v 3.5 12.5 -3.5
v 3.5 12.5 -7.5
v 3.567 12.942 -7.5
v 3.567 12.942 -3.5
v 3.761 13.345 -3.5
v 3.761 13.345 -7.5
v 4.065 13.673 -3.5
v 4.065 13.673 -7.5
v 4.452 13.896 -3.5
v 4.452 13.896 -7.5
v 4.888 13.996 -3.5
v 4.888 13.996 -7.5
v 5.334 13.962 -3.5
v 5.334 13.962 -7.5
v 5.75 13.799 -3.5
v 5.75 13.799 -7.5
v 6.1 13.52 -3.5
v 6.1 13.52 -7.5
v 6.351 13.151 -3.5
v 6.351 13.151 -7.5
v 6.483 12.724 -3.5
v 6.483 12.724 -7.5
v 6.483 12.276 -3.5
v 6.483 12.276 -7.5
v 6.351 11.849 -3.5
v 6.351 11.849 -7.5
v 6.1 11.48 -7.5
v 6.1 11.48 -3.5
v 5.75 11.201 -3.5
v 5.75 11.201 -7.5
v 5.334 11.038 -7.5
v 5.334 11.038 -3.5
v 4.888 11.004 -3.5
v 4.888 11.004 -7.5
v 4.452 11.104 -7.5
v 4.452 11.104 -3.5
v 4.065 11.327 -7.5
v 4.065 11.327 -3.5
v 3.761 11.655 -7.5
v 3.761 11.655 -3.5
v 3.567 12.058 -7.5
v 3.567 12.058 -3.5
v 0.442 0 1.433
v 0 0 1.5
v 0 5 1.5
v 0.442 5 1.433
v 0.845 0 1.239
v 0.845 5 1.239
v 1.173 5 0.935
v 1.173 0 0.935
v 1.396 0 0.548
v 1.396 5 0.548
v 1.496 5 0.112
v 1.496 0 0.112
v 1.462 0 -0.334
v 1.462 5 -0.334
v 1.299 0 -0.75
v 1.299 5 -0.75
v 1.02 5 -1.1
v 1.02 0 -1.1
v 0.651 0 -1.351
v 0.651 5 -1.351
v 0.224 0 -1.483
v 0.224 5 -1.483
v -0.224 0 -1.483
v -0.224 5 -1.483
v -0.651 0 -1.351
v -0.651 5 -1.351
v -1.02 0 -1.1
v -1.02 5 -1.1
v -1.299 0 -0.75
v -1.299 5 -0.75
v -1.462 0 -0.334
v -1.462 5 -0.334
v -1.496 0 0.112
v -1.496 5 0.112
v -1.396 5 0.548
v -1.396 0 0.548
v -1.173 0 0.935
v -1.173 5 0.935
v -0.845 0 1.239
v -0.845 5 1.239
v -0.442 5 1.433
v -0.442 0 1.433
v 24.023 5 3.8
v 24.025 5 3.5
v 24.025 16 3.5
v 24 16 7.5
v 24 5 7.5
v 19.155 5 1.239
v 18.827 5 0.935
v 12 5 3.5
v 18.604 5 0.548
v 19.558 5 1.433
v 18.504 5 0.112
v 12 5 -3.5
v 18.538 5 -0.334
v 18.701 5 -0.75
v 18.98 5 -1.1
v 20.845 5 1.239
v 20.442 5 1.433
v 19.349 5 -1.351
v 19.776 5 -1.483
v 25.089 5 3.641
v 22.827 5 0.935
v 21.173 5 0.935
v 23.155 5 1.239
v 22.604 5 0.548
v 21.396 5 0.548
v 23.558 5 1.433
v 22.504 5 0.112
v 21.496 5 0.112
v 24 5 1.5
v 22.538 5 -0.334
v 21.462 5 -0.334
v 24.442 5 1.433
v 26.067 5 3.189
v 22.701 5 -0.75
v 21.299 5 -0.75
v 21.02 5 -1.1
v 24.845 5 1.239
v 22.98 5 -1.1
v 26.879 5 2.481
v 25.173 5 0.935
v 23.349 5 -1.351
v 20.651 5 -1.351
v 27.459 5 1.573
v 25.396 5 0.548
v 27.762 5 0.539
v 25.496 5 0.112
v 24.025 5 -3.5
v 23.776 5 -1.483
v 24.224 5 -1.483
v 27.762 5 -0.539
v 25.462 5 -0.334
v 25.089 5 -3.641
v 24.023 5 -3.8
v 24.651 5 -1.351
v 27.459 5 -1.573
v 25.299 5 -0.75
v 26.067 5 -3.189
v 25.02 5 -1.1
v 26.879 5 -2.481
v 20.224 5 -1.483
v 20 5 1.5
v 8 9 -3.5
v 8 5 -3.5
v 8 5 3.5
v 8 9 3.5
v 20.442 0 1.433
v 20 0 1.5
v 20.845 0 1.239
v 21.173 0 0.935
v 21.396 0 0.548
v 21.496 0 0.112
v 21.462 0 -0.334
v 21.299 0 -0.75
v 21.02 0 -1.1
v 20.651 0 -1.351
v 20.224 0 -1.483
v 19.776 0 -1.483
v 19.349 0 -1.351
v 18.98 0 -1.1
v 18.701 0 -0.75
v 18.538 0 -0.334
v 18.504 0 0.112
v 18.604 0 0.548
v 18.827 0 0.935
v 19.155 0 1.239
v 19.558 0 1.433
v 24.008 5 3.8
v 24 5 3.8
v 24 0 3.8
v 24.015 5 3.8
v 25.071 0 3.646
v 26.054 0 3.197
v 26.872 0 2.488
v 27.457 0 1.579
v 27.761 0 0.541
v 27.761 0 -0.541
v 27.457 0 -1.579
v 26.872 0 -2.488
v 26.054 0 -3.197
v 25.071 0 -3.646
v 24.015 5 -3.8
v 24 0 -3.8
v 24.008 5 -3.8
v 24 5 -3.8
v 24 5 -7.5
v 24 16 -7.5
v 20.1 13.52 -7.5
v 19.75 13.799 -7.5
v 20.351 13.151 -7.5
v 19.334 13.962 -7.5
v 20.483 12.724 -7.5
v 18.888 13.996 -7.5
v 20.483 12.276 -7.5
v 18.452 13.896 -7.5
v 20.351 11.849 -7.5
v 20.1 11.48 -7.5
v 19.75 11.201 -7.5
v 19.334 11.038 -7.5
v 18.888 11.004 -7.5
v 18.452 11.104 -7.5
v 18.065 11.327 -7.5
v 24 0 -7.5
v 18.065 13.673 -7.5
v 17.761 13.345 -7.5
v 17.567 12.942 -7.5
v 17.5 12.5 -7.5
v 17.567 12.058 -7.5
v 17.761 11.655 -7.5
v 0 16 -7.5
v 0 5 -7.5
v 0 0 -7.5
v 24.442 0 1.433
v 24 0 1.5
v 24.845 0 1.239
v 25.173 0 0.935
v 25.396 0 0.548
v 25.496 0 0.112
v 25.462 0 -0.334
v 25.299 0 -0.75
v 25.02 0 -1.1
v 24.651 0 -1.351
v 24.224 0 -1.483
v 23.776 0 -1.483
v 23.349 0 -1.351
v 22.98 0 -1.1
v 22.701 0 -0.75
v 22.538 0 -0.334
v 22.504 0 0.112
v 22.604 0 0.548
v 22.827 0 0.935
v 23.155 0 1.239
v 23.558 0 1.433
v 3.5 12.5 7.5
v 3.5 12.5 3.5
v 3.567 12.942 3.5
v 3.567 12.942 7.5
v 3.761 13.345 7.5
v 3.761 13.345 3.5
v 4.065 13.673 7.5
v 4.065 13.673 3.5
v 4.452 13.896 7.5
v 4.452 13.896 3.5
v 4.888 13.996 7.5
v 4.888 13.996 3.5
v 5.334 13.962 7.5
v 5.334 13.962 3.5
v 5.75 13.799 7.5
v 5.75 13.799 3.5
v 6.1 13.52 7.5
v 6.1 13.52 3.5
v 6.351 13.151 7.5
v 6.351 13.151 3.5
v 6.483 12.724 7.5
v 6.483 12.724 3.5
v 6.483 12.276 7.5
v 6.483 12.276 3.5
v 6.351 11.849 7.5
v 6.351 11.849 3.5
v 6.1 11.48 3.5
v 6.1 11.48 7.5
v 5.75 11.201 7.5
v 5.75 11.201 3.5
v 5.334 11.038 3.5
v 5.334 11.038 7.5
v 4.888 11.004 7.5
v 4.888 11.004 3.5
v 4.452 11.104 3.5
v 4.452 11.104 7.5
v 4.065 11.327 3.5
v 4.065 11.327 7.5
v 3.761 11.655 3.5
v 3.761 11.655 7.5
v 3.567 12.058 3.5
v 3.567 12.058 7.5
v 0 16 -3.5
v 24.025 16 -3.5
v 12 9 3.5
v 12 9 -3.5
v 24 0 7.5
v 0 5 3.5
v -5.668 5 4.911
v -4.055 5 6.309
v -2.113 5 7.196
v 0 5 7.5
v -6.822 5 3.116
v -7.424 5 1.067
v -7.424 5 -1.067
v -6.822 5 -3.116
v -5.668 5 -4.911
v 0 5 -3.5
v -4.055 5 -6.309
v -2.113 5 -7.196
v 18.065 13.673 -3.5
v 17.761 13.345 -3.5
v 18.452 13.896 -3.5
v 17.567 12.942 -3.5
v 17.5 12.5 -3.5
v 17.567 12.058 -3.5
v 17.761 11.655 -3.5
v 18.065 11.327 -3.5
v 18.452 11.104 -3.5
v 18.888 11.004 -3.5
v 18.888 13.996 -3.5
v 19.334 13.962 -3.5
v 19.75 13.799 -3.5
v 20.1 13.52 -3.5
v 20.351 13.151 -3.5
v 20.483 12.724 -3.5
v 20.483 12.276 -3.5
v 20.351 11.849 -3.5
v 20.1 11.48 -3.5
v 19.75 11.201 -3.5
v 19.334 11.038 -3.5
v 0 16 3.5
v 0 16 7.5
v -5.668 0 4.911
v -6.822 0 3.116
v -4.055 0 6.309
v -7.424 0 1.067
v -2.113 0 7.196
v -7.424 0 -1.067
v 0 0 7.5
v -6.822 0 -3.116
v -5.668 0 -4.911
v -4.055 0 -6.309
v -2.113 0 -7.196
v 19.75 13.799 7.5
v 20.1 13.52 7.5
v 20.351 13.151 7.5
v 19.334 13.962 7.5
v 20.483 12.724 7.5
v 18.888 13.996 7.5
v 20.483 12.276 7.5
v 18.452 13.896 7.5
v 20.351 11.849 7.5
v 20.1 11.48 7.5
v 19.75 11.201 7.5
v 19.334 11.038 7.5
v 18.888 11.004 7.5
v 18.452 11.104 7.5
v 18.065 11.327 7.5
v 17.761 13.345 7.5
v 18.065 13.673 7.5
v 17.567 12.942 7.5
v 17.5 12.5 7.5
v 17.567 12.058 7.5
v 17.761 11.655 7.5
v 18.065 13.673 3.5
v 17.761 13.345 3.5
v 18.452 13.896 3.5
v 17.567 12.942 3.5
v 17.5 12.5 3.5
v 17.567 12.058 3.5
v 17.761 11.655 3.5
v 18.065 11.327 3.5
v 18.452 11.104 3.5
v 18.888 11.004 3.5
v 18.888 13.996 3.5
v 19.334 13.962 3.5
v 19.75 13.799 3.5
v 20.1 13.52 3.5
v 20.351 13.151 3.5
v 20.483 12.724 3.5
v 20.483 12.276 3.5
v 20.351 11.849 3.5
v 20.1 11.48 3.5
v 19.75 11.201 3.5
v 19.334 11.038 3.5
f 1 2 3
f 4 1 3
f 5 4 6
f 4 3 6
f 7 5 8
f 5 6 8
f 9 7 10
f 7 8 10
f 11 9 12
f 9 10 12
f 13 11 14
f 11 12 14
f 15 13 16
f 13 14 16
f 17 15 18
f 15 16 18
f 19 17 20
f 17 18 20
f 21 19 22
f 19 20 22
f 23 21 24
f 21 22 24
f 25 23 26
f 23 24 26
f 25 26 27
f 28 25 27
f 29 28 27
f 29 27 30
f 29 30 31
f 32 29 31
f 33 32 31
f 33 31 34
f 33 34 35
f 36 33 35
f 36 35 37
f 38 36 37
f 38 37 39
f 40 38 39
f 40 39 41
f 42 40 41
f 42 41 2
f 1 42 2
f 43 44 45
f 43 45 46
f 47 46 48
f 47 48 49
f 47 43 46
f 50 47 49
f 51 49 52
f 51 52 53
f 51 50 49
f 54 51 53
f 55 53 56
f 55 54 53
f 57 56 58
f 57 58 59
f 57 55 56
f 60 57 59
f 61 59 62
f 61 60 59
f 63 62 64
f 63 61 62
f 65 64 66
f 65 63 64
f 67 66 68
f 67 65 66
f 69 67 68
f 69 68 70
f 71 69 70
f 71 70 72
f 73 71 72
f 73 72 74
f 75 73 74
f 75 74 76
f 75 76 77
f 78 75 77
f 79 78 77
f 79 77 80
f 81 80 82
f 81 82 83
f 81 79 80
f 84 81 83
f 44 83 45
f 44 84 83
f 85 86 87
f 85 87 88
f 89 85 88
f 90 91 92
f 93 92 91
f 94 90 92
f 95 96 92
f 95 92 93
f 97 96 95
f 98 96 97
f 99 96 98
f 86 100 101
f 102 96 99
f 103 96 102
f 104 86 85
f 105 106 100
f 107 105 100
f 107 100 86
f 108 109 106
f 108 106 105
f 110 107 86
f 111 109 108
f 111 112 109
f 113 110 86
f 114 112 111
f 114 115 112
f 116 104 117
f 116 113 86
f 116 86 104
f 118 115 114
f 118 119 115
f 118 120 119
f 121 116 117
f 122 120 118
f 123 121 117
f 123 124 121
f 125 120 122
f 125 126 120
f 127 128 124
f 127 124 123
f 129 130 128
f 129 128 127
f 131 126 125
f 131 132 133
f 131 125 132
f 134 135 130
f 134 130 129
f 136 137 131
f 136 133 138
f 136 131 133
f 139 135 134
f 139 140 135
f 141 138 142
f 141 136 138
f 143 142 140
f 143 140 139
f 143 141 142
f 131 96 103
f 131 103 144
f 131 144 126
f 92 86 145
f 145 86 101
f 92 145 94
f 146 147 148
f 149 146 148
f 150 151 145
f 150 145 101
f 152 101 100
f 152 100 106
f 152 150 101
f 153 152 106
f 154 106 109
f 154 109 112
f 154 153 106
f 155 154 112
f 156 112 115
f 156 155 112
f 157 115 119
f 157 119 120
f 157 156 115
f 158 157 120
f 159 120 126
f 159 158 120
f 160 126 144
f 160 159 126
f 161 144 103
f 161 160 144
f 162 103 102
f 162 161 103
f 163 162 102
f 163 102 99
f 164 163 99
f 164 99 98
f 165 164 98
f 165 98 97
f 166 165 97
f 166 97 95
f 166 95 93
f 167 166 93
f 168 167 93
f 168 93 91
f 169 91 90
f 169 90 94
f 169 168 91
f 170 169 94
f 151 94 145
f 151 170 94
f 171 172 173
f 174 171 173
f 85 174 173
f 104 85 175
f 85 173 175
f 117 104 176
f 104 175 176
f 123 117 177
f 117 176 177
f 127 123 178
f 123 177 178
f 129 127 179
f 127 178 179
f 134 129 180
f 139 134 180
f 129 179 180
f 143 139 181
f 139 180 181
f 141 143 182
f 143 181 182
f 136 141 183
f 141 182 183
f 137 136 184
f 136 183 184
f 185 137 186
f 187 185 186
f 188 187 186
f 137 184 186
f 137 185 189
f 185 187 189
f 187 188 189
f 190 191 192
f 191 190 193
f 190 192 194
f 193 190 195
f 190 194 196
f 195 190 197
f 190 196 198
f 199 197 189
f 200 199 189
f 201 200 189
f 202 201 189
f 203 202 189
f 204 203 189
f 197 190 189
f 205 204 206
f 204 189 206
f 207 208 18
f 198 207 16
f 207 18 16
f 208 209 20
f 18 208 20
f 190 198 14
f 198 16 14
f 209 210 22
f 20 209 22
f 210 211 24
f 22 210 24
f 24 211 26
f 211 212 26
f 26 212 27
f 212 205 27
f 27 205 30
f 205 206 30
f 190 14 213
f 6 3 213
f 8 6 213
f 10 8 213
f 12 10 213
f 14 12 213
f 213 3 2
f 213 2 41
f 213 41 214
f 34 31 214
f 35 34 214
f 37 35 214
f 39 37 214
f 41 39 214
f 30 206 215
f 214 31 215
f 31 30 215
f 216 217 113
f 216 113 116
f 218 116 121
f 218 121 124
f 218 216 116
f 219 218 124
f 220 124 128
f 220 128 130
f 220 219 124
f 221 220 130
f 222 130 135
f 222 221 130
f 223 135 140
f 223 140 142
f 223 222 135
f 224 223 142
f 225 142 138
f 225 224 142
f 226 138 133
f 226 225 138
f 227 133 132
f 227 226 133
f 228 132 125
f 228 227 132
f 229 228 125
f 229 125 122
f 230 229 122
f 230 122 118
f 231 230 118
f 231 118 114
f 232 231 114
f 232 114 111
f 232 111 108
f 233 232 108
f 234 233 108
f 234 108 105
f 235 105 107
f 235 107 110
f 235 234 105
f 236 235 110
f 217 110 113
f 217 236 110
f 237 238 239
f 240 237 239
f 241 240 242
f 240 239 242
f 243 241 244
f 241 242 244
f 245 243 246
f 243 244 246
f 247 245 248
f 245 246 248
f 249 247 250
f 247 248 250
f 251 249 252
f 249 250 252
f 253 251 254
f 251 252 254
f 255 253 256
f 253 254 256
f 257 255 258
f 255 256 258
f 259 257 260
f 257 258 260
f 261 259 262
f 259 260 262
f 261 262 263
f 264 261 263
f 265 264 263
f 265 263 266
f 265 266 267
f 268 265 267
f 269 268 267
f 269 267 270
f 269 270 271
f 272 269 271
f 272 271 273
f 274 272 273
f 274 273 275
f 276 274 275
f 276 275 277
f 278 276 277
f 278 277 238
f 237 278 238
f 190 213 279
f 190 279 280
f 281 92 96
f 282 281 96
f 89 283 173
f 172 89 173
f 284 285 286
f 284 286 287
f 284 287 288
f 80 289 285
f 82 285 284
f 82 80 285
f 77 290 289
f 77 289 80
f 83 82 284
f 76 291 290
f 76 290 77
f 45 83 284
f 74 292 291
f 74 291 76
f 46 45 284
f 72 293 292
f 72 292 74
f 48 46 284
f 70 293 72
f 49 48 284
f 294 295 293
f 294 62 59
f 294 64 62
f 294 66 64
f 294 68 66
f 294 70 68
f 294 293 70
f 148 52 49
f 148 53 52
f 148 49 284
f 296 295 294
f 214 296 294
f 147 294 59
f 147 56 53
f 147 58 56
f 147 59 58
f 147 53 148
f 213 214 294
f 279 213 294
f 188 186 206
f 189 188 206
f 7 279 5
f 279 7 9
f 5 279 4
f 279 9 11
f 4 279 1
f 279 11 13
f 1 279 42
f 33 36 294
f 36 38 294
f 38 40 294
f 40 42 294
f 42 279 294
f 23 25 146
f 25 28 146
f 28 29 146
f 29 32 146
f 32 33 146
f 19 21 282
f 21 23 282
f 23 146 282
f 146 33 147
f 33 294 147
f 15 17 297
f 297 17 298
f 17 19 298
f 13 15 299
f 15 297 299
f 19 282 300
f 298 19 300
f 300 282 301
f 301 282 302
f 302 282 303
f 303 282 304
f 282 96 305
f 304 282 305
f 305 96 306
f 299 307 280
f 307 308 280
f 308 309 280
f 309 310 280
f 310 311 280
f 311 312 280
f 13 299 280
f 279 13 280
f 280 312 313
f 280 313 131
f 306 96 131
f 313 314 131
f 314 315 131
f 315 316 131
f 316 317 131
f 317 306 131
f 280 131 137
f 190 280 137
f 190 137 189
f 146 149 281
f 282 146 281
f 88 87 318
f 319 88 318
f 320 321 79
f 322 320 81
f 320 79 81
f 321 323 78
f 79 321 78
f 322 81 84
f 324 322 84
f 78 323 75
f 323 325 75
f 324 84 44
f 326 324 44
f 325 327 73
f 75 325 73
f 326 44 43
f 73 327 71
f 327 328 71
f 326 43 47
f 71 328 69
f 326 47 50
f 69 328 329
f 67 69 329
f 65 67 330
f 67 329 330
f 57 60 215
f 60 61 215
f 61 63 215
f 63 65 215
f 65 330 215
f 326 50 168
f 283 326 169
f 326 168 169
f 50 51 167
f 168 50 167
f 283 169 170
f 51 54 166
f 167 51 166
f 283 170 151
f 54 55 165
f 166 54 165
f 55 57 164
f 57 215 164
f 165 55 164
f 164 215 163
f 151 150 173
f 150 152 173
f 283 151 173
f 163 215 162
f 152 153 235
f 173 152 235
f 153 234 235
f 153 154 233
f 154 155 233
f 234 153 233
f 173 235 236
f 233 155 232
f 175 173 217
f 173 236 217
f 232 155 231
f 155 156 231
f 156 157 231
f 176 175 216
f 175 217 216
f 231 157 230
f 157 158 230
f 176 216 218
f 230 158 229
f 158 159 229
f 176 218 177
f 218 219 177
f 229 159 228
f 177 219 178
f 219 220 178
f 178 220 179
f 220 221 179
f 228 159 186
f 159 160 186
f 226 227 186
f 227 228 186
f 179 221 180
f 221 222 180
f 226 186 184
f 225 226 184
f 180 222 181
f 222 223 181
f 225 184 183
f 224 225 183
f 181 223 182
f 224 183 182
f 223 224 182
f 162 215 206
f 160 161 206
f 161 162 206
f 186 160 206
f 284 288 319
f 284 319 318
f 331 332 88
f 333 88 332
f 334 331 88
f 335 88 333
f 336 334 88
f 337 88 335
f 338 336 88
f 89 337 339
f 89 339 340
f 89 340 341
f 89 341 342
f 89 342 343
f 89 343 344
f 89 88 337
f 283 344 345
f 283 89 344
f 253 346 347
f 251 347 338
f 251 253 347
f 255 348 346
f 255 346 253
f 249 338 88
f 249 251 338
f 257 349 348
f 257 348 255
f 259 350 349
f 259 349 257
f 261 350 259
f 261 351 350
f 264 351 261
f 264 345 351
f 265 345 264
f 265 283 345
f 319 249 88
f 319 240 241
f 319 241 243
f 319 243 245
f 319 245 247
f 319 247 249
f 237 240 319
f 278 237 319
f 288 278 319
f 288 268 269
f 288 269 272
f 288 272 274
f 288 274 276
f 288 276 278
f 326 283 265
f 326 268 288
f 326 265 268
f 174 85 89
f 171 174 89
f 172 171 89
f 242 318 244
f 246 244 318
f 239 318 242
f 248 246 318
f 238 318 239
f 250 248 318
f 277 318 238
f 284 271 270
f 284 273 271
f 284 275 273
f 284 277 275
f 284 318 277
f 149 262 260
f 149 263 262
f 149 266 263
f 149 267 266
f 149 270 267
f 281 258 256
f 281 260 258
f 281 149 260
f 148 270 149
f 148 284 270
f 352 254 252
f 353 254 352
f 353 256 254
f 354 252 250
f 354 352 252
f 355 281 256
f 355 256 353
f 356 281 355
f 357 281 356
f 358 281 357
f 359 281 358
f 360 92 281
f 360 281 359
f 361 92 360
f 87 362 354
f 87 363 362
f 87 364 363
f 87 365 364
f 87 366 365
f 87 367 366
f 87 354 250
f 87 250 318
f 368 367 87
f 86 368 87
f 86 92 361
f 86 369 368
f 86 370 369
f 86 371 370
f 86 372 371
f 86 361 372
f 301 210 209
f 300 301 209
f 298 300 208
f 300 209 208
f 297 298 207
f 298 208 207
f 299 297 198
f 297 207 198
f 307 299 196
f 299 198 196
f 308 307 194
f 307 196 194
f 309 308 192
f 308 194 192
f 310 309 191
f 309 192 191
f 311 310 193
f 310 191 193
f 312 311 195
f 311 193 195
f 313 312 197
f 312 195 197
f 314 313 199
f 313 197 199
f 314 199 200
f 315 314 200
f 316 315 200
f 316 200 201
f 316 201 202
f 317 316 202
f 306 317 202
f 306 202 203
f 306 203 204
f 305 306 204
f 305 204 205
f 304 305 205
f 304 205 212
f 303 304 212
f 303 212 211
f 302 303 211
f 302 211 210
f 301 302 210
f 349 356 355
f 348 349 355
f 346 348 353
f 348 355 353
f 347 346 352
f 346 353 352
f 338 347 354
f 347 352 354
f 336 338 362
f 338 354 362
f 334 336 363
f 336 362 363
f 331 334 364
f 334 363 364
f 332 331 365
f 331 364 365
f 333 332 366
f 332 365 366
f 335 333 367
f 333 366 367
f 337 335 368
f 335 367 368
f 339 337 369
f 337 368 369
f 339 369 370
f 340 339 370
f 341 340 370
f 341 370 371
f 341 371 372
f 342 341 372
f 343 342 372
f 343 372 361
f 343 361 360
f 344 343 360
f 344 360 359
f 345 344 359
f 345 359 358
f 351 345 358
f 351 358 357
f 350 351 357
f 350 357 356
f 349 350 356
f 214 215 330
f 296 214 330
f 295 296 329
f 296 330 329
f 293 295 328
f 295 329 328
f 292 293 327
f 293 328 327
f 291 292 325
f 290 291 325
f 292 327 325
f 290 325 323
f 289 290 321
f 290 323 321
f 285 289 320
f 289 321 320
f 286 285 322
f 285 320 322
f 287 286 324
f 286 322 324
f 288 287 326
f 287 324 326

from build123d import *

# Parameters (mm, degrees)
SKETCH1_R                = 1.5
BOSS_EXTRUDE1_DEPTH      = 5
BOSS_EXTRUDE2_DEPTH      = 11
SKETCH3_W                = 2
SKETCH3_H                = 3.5
BOSS_EXTRUDE3_DEPTH      = 4
F_3_0_3_DIAMETER_HOLE2_D = 3


with BuildPart() as part:
    # Sketch1 → Boss-Extrude1 (new body)
    with BuildSketch(Plane(origin=(0, 0, 0), x_dir=(1, 0, 0), z_dir=(0, 1, 0))):
        with BuildLine():
            Line((24, -7.5), (24, -3.8))
            ThreePointArc((24, -3.8), (27.8, 0), (24, 3.8))
            Line((24, 3.8), (24, 7.5))
            Line((24, 7.5), (0, 7.5))
            ThreePointArc((0, 7.5), (-7.5, 0), (0, -7.5))
            Line((0, -7.5), (24, -7.5))
        make_face()
        with Locations(Location((20, 0, 0), (0, 0, 270))):
            Circle(SKETCH1_R, mode=Mode.SUBTRACT)
        with Locations(Location((24, 0, 0), (0, 0, 270))):
            Circle(SKETCH1_R, mode=Mode.SUBTRACT)
        with Locations(Location((0, 0, 0), (0, 0, 270))):
            Circle(SKETCH1_R, mode=Mode.SUBTRACT)
    extrude(amount=BOSS_EXTRUDE1_DEPTH)

    # Sketch2 → Boss-Extrude2 (add)
    with BuildSketch(Plane(origin=(0, 5, 0), x_dir=(1, 0, 0), z_dir=(0, 1, 0))):
        Polygon((0, -7.5), (0, -3.5), (24.024712411, -3.5), (24, -7.5), align=None)
        Polygon((24.024712411, 3.5), (24, 7.5), (0, 7.5), (0, 3.5), align=None)
    extrude(amount=BOSS_EXTRUDE2_DEPTH)

    # Sketch3 → Boss-Extrude3 (add)
    with BuildSketch(Plane(origin=(0, 5, 0), x_dir=(1, 0, 0), z_dir=(0, 1, 0))):
        Polygon((10, 0), (8, 0), (8, -3.5), (12, -3.5), (12, 0), align=None)
        with Locations((11, 1.75)):
            Rectangle(SKETCH3_W, SKETCH3_H)
        with Locations((9, 1.75)):
            Rectangle(SKETCH3_W, SKETCH3_H)
    extrude(amount=BOSS_EXTRUDE3_DEPTH)

    # Ø3.0 (3) Diameter Hole2 (through all)
    with Locations(Plane.XY.offset(7.5)):
        with Locations((19, 12.5), (5, 12.5)):
            Hole(F_3_0_3_DIAMETER_HOLE2_D / 2)


solid = part.part
